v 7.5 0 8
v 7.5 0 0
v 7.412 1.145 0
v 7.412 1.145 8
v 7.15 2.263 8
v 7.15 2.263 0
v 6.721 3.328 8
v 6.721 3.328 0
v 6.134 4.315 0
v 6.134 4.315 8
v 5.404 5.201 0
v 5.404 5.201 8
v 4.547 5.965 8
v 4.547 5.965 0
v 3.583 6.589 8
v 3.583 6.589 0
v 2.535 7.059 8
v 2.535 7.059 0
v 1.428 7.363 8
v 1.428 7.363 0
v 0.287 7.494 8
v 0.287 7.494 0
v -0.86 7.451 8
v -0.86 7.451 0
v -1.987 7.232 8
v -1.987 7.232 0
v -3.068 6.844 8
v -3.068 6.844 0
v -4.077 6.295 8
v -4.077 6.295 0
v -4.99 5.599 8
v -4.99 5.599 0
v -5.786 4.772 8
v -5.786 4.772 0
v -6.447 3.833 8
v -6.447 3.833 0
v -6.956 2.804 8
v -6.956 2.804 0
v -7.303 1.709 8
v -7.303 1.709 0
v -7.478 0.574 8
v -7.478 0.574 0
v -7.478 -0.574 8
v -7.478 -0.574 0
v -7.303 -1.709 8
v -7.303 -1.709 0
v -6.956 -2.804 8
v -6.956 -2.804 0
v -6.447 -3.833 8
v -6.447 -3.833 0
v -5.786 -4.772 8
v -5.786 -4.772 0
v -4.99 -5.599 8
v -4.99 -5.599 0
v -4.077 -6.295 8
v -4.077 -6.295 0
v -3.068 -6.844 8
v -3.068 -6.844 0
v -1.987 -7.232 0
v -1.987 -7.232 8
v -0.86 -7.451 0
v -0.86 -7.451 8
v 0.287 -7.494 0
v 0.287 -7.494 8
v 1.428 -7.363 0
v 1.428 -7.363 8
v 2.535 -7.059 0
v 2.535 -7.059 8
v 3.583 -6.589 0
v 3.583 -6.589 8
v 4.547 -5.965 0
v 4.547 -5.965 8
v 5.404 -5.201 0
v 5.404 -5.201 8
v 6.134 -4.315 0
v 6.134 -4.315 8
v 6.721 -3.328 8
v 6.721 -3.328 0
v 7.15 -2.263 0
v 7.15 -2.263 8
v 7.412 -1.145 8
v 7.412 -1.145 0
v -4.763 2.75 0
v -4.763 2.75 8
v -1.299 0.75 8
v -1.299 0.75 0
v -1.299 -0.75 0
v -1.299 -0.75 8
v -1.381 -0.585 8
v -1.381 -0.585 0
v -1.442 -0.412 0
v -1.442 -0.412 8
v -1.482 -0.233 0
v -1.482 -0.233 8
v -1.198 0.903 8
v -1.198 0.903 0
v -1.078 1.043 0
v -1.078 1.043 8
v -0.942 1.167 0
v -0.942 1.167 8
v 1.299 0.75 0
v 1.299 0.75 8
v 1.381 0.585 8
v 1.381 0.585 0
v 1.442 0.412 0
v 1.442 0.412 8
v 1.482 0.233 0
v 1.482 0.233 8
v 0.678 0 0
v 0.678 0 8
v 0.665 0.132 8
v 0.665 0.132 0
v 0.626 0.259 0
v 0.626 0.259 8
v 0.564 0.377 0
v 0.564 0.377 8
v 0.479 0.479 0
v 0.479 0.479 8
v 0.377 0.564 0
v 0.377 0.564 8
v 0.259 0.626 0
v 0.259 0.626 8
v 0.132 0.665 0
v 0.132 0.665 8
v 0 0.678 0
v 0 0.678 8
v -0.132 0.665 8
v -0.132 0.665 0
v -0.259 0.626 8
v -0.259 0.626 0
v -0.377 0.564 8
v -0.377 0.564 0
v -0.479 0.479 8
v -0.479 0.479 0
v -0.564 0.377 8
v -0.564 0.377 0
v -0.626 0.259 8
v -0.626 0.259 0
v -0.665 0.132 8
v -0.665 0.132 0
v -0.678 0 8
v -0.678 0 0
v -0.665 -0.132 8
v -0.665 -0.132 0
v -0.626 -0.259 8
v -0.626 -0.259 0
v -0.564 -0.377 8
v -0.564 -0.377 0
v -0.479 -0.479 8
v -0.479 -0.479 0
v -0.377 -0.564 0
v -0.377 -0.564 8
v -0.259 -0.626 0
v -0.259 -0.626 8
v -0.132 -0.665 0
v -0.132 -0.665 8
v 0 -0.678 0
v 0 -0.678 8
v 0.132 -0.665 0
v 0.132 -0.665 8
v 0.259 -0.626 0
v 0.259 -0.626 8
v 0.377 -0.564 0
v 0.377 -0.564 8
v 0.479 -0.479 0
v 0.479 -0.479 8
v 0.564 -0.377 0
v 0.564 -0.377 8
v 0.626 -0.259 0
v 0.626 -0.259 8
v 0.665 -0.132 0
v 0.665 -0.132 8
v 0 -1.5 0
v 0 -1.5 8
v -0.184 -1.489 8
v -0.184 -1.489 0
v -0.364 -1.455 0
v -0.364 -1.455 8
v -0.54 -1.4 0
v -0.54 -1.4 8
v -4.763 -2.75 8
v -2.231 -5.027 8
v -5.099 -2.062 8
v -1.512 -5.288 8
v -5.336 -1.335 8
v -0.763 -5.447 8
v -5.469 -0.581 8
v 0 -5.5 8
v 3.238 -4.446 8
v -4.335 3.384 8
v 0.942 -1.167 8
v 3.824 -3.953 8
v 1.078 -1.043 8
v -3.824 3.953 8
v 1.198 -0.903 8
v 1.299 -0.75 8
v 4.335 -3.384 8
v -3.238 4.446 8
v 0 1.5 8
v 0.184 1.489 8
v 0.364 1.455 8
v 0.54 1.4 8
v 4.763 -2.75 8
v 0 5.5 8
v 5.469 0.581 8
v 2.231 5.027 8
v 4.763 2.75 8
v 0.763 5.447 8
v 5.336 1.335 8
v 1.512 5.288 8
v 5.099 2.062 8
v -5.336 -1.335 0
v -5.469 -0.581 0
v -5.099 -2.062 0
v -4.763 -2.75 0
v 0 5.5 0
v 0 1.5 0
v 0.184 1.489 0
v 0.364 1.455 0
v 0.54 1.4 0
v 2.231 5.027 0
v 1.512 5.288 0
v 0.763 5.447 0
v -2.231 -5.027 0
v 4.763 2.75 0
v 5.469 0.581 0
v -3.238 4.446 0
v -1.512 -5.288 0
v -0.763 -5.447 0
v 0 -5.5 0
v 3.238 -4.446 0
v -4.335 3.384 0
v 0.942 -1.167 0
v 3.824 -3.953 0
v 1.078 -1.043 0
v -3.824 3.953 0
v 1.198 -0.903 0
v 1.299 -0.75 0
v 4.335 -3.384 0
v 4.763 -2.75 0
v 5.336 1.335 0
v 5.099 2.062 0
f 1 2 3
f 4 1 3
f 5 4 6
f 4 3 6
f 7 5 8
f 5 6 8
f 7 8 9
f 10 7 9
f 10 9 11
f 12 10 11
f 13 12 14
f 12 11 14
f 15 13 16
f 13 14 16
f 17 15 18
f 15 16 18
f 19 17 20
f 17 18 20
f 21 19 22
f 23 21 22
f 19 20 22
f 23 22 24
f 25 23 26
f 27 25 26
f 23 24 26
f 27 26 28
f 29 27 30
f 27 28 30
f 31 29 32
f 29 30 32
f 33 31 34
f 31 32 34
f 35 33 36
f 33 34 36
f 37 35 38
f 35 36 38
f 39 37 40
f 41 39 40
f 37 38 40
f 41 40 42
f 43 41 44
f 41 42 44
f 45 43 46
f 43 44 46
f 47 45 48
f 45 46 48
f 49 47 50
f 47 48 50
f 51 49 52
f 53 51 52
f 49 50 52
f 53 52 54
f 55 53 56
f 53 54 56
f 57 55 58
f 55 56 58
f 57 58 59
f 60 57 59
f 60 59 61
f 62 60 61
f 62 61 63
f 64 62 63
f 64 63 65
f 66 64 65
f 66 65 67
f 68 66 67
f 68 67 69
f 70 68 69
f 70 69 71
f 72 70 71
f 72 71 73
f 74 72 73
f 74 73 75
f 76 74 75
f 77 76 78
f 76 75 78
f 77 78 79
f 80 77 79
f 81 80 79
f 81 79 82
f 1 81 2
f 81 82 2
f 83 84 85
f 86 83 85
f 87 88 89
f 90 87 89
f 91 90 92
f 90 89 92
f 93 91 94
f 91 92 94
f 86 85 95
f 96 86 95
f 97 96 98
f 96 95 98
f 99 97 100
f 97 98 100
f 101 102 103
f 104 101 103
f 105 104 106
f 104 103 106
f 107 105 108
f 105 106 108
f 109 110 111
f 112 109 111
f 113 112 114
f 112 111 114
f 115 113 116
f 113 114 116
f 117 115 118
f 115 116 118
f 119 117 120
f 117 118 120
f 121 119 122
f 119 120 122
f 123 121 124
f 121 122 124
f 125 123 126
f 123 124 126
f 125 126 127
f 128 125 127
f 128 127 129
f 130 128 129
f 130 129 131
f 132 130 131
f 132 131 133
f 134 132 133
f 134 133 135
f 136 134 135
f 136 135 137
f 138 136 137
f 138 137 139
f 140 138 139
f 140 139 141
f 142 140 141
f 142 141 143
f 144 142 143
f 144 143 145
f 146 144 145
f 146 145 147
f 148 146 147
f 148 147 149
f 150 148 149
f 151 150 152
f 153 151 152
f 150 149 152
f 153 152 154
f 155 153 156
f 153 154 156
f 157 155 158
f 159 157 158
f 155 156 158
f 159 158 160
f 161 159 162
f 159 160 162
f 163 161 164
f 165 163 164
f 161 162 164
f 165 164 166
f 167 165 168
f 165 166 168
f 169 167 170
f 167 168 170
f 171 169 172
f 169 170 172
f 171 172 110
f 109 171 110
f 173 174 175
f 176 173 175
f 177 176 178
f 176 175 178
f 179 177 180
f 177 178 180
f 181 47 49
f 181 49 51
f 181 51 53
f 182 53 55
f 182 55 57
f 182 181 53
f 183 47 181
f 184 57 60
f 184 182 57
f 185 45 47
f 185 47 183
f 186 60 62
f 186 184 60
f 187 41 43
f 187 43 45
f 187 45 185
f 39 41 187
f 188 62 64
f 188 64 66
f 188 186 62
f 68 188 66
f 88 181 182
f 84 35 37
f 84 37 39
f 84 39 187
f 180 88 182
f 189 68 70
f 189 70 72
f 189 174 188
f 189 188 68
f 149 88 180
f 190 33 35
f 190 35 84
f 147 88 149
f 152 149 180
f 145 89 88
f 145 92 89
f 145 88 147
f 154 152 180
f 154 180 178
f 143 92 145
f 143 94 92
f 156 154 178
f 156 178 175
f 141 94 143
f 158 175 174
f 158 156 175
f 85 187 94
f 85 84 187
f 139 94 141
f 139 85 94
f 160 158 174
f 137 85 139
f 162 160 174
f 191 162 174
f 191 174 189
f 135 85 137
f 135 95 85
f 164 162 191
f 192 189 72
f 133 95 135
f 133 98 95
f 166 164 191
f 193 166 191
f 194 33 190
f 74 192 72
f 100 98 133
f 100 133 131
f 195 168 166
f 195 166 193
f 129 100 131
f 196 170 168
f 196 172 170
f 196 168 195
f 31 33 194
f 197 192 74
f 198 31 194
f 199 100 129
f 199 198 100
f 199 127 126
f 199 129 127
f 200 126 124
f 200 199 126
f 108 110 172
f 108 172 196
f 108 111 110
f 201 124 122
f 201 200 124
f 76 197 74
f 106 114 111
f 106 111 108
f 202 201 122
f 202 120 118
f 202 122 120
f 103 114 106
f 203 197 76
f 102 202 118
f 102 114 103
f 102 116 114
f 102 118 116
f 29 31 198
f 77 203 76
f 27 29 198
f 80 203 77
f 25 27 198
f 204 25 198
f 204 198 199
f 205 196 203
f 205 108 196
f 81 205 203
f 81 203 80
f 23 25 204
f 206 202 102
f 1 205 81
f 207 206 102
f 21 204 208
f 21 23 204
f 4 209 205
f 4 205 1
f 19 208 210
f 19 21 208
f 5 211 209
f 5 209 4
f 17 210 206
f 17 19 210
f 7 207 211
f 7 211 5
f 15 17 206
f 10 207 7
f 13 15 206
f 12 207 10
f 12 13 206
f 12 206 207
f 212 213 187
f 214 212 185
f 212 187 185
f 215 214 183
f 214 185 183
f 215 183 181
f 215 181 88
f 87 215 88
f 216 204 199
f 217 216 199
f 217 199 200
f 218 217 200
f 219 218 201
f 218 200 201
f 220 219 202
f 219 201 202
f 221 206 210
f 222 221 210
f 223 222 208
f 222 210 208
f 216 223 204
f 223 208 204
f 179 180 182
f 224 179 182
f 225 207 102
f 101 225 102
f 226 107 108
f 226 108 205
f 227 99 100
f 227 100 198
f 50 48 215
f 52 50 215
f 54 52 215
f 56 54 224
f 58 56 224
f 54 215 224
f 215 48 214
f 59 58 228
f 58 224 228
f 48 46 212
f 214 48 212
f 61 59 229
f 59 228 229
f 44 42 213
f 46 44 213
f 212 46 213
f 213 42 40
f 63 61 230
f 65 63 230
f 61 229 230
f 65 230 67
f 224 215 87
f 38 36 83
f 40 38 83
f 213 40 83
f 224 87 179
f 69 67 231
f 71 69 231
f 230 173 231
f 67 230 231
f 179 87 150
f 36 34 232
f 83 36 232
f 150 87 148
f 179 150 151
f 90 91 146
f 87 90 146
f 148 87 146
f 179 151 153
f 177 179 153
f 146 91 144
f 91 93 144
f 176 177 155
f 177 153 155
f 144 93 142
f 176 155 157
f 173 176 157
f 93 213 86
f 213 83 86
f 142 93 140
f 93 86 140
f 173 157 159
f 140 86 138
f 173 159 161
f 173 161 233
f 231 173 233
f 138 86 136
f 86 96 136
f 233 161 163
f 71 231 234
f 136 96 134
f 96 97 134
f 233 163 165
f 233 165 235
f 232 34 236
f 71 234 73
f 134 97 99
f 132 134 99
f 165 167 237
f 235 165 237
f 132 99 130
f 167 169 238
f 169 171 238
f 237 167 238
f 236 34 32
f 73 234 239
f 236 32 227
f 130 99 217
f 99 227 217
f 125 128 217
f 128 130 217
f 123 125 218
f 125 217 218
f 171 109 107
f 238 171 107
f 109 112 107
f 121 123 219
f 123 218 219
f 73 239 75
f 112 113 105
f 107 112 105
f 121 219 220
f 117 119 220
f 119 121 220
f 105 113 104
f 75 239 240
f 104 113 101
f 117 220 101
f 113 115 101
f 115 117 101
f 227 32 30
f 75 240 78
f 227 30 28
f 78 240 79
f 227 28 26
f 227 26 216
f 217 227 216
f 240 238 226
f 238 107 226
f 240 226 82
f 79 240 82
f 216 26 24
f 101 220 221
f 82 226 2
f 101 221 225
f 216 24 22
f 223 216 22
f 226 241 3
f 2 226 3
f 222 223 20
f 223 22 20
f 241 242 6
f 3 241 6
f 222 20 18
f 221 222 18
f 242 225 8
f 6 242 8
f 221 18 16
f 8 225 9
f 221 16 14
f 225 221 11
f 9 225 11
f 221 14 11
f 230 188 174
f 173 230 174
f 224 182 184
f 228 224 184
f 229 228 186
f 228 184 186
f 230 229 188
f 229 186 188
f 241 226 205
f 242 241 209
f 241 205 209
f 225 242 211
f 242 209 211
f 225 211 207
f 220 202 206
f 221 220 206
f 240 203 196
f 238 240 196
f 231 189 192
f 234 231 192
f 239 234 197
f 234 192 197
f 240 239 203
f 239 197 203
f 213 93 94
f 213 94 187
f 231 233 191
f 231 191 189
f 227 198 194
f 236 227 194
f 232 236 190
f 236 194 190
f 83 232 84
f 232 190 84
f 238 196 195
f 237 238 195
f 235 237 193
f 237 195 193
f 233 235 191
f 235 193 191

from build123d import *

# Parameters (mm, degrees)
F0_R     = 7.5
F1_DEPTH = 8
F3_DEPTH = 100
F4_R     = 0.67804
F5_DEPTH = 100


with BuildPart() as f1:
    # F0 (on Top) → F1 (new body)
    with BuildSketch(Plane.XY):
        Circle(F0_R)
    extrude(amount=F1_DEPTH)

    # F2 (on face) → F3 (cut)
    with BuildSketch(Plane.XY.offset(8)):
        with BuildLine():
            ThreePointArc((0, 1.5), (0.274417, 1.474685), (0.539571, 1.399594))
            Line((0.539571, 1.399594), (2.231121, 5.027136))
            ThreePointArc((2.231121, 5.027136), (1.14034, 5.380485), (0, 5.5))
            Line((0, 5.5), (0, 1.5))
        make_face()
        with BuildLine():
            ThreePointArc((-1.299038, 0.75), (-1.139906, 0.974994), (-0.942299, 1.167079))
            Line((-0.942299, 1.167079), (-3.238067, 4.445776))
            ThreePointArc((-3.238067, 4.445776), (-4.089467, 3.677806), (-4.76314, 2.75))
            Line((-4.76314, 2.75), (-1.299038, 0.75))
        make_face()
        with BuildLine():
            Line((-4.76314, -2.75), (-1.299038, -0.75))
            ThreePointArc((-1.299038, -0.75), (-1.414323, -0.499691), (-1.481869, -0.232515))
            Line((-1.481869, -0.232515), (-5.469188, -0.58136))
            ThreePointArc((-5.469188, -0.58136), (-5.229807, -1.702679), (-4.76314, -2.75))
        make_face()
        with BuildLine():
            Line((0, -5.5), (0, -1.5))
            ThreePointArc((0, -1.5), (-0.274417, -1.474685), (-0.539571, -1.399594))
            Line((-0.539571, -1.399594), (-2.231121, -5.027136))
            ThreePointArc((-2.231121, -5.027136), (-1.14034, -5.380485), (0, -5.5))
        make_face()
        with BuildLine():
            Line((4.76314, -2.75), (1.299038, -0.75))
            ThreePointArc((1.299038, -0.75), (1.139906, -0.974994), (0.942299, -1.167079))
            Line((0.942299, -1.167079), (3.238067, -4.445776))
            ThreePointArc((3.238067, -4.445776), (4.089467, -3.677806), (4.76314, -2.75))
        make_face()
        with BuildLine():
            ThreePointArc((1.299038, 0.75), (1.414323, 0.499691), (1.481869, 0.232515))
            Line((1.481869, 0.232515), (5.469188, 0.58136))
            ThreePointArc((5.469188, 0.58136), (5.229807, 1.702679), (4.76314, 2.75))
            Line((4.76314, 2.75), (1.299038, 0.75))
        make_face()
    extrude(amount=-F3_DEPTH, mode=Mode.SUBTRACT)

    # F4 (on face) → F5 (cut)
    with BuildSketch(Plane.XY.offset(8)):
        Circle(F4_R)
    extrude(amount=-F5_DEPTH, mode=Mode.SUBTRACT)


solid = f1.part
